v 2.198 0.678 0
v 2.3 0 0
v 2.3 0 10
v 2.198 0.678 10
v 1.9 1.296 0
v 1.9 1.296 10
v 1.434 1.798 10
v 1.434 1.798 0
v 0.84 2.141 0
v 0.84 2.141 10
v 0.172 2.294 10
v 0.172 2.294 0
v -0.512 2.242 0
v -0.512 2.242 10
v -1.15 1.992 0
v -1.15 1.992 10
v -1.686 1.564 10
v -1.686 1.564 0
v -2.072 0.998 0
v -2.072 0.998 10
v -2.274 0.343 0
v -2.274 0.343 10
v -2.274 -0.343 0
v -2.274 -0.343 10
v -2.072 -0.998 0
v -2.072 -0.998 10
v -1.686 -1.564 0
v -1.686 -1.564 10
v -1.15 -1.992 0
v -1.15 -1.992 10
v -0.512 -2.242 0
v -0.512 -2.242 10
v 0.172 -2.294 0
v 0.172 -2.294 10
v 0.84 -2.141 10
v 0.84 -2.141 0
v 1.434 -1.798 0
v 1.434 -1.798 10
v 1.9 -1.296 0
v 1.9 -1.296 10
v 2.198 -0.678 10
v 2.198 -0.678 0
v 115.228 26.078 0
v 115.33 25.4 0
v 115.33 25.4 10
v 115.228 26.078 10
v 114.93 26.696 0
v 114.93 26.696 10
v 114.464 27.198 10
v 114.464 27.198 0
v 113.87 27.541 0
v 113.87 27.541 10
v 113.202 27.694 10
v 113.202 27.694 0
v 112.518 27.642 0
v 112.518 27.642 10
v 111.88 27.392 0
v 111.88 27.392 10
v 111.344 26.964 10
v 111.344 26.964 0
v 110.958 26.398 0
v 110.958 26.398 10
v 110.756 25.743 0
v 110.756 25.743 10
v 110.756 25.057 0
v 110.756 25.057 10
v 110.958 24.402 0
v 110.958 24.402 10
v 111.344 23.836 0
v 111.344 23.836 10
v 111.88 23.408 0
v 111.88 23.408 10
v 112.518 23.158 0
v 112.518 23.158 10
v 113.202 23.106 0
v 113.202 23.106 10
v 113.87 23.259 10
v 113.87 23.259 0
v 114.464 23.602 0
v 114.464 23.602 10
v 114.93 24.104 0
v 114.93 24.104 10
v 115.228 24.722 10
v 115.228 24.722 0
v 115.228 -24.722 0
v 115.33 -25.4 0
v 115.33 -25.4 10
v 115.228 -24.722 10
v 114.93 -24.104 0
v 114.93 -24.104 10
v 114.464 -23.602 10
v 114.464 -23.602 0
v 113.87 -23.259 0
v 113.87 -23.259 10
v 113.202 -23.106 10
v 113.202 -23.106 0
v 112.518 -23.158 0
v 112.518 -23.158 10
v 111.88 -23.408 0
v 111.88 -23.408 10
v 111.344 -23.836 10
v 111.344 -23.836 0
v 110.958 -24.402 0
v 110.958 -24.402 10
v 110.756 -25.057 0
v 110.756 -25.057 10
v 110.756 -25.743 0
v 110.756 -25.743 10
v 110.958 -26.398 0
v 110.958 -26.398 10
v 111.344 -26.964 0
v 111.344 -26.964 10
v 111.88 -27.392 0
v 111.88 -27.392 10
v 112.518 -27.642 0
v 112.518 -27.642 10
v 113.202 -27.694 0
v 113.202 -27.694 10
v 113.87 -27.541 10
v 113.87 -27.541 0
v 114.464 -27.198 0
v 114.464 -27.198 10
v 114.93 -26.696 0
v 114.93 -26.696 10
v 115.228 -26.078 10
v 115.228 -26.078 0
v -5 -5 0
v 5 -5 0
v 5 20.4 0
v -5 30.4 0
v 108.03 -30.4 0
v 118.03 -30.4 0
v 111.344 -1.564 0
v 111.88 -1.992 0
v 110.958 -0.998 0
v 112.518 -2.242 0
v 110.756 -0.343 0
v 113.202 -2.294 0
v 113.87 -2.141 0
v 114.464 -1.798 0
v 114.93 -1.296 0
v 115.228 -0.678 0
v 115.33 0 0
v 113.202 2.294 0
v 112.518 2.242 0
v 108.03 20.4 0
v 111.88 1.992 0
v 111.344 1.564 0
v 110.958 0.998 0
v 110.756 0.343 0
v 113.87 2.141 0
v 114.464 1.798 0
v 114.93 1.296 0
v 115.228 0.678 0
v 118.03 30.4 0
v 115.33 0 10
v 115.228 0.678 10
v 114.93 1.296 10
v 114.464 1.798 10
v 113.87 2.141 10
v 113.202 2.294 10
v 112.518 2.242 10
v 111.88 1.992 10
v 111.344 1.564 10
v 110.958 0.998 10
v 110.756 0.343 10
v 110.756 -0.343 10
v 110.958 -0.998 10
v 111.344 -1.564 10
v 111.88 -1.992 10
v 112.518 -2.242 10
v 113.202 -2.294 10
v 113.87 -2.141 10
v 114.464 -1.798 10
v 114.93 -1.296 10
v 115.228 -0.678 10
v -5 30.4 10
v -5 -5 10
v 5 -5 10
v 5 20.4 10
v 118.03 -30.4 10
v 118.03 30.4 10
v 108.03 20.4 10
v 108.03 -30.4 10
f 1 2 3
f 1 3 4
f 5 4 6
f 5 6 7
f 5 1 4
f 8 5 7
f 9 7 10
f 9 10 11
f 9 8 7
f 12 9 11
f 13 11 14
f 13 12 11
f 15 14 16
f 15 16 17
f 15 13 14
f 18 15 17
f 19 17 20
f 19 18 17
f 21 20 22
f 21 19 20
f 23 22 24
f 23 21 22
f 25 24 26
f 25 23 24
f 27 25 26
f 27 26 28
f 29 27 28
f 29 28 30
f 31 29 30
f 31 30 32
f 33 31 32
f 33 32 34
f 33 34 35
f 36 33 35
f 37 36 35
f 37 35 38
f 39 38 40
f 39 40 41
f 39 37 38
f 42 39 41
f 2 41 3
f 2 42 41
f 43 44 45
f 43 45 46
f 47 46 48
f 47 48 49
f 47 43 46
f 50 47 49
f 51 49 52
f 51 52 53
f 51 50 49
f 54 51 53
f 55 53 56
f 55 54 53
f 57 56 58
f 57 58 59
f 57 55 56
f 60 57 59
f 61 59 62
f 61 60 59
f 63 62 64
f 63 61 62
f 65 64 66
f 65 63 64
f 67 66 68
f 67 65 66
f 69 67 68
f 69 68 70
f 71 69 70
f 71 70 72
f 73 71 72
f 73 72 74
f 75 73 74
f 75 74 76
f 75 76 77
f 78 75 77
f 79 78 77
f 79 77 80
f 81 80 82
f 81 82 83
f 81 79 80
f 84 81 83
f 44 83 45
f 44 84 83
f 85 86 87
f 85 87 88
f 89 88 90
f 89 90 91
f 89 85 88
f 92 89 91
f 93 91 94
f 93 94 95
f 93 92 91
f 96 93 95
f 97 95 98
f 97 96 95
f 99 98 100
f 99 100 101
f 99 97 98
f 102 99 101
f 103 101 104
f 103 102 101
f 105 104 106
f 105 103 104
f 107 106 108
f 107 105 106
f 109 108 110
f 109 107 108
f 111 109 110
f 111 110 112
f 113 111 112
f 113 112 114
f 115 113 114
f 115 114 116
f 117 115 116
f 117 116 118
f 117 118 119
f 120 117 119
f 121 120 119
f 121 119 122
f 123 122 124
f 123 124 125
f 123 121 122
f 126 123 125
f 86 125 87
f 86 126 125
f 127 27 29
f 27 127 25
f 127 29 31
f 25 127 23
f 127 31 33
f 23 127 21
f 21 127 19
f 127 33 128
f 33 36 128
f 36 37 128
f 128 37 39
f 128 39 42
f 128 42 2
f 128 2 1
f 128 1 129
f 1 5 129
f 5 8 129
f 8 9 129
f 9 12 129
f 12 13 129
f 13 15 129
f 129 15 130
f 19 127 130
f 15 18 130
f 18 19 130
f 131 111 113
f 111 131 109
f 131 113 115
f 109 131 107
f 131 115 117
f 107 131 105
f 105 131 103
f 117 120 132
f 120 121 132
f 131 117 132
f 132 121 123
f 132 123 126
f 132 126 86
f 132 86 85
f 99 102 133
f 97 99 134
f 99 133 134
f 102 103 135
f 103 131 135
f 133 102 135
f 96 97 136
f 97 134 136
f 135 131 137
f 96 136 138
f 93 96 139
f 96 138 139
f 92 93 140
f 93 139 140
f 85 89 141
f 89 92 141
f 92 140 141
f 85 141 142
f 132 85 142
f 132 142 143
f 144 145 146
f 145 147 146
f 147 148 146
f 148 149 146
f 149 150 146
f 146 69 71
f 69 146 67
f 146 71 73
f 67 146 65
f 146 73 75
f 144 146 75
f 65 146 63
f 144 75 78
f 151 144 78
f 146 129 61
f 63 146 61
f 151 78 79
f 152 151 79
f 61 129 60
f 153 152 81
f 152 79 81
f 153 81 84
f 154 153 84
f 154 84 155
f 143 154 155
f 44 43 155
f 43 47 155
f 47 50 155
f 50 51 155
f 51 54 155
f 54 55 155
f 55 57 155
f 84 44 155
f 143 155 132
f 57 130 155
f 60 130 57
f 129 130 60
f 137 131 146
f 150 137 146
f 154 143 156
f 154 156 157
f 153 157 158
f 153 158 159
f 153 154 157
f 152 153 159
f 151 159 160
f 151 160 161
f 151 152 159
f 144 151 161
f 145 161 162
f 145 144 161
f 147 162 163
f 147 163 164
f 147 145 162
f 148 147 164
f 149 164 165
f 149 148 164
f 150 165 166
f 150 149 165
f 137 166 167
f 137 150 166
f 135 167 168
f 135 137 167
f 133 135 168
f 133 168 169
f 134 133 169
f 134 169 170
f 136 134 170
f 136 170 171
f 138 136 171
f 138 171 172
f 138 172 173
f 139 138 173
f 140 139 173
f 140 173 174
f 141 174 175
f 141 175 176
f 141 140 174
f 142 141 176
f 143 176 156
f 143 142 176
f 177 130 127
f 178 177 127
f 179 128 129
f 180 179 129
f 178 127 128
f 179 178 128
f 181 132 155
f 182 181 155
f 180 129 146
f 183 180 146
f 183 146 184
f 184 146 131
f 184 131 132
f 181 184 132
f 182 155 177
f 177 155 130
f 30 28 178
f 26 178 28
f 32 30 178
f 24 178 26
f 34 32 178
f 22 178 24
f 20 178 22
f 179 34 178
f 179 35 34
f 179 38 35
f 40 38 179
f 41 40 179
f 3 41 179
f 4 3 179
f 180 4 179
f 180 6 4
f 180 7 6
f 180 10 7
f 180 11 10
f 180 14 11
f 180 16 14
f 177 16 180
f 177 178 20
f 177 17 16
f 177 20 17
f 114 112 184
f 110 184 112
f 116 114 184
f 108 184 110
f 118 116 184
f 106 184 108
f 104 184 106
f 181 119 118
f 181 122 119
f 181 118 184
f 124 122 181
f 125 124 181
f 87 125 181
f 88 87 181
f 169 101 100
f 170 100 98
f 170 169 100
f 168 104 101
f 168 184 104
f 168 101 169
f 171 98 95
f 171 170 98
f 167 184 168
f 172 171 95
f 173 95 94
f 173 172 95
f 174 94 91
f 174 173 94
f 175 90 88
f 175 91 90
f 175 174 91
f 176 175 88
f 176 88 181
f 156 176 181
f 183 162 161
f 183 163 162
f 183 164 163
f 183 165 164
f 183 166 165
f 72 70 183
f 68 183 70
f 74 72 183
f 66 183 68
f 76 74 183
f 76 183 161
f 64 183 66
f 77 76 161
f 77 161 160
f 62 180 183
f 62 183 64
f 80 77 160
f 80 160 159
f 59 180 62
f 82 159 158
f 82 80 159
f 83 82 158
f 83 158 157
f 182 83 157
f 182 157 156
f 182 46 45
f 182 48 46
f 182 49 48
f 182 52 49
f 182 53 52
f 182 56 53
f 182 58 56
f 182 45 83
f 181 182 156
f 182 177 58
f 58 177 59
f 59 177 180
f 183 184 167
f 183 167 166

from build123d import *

# Parameters (mm, degrees)
SKETCH1_R           = 2.3
BOSS_EXTRUDE1_DEPTH = 10


with BuildPart() as part:
    # Sketch1 → Boss-Extrude1 (new body)
    with BuildSketch(Plane.XY):
        Polygon((108.03, -30.4), (118.03, -30.4), (118.03, 30.4), (-5, 30.4), (-5, -5), (5, -5), (5, 20.4), (108.03, 20.4), align=None)
        Circle(SKETCH1_R, mode=Mode.SUBTRACT)
        with Locations((113.03, 0)):
            Circle(SKETCH1_R, mode=Mode.SUBTRACT)
        with Locations((113.03, -25.4)):
            Circle(SKETCH1_R, mode=Mode.SUBTRACT)
        with Locations((113.03, 25.4)):
            Circle(SKETCH1_R, mode=Mode.SUBTRACT)
    extrude(amount=BOSS_EXTRUDE1_DEPTH)


solid = part.part
